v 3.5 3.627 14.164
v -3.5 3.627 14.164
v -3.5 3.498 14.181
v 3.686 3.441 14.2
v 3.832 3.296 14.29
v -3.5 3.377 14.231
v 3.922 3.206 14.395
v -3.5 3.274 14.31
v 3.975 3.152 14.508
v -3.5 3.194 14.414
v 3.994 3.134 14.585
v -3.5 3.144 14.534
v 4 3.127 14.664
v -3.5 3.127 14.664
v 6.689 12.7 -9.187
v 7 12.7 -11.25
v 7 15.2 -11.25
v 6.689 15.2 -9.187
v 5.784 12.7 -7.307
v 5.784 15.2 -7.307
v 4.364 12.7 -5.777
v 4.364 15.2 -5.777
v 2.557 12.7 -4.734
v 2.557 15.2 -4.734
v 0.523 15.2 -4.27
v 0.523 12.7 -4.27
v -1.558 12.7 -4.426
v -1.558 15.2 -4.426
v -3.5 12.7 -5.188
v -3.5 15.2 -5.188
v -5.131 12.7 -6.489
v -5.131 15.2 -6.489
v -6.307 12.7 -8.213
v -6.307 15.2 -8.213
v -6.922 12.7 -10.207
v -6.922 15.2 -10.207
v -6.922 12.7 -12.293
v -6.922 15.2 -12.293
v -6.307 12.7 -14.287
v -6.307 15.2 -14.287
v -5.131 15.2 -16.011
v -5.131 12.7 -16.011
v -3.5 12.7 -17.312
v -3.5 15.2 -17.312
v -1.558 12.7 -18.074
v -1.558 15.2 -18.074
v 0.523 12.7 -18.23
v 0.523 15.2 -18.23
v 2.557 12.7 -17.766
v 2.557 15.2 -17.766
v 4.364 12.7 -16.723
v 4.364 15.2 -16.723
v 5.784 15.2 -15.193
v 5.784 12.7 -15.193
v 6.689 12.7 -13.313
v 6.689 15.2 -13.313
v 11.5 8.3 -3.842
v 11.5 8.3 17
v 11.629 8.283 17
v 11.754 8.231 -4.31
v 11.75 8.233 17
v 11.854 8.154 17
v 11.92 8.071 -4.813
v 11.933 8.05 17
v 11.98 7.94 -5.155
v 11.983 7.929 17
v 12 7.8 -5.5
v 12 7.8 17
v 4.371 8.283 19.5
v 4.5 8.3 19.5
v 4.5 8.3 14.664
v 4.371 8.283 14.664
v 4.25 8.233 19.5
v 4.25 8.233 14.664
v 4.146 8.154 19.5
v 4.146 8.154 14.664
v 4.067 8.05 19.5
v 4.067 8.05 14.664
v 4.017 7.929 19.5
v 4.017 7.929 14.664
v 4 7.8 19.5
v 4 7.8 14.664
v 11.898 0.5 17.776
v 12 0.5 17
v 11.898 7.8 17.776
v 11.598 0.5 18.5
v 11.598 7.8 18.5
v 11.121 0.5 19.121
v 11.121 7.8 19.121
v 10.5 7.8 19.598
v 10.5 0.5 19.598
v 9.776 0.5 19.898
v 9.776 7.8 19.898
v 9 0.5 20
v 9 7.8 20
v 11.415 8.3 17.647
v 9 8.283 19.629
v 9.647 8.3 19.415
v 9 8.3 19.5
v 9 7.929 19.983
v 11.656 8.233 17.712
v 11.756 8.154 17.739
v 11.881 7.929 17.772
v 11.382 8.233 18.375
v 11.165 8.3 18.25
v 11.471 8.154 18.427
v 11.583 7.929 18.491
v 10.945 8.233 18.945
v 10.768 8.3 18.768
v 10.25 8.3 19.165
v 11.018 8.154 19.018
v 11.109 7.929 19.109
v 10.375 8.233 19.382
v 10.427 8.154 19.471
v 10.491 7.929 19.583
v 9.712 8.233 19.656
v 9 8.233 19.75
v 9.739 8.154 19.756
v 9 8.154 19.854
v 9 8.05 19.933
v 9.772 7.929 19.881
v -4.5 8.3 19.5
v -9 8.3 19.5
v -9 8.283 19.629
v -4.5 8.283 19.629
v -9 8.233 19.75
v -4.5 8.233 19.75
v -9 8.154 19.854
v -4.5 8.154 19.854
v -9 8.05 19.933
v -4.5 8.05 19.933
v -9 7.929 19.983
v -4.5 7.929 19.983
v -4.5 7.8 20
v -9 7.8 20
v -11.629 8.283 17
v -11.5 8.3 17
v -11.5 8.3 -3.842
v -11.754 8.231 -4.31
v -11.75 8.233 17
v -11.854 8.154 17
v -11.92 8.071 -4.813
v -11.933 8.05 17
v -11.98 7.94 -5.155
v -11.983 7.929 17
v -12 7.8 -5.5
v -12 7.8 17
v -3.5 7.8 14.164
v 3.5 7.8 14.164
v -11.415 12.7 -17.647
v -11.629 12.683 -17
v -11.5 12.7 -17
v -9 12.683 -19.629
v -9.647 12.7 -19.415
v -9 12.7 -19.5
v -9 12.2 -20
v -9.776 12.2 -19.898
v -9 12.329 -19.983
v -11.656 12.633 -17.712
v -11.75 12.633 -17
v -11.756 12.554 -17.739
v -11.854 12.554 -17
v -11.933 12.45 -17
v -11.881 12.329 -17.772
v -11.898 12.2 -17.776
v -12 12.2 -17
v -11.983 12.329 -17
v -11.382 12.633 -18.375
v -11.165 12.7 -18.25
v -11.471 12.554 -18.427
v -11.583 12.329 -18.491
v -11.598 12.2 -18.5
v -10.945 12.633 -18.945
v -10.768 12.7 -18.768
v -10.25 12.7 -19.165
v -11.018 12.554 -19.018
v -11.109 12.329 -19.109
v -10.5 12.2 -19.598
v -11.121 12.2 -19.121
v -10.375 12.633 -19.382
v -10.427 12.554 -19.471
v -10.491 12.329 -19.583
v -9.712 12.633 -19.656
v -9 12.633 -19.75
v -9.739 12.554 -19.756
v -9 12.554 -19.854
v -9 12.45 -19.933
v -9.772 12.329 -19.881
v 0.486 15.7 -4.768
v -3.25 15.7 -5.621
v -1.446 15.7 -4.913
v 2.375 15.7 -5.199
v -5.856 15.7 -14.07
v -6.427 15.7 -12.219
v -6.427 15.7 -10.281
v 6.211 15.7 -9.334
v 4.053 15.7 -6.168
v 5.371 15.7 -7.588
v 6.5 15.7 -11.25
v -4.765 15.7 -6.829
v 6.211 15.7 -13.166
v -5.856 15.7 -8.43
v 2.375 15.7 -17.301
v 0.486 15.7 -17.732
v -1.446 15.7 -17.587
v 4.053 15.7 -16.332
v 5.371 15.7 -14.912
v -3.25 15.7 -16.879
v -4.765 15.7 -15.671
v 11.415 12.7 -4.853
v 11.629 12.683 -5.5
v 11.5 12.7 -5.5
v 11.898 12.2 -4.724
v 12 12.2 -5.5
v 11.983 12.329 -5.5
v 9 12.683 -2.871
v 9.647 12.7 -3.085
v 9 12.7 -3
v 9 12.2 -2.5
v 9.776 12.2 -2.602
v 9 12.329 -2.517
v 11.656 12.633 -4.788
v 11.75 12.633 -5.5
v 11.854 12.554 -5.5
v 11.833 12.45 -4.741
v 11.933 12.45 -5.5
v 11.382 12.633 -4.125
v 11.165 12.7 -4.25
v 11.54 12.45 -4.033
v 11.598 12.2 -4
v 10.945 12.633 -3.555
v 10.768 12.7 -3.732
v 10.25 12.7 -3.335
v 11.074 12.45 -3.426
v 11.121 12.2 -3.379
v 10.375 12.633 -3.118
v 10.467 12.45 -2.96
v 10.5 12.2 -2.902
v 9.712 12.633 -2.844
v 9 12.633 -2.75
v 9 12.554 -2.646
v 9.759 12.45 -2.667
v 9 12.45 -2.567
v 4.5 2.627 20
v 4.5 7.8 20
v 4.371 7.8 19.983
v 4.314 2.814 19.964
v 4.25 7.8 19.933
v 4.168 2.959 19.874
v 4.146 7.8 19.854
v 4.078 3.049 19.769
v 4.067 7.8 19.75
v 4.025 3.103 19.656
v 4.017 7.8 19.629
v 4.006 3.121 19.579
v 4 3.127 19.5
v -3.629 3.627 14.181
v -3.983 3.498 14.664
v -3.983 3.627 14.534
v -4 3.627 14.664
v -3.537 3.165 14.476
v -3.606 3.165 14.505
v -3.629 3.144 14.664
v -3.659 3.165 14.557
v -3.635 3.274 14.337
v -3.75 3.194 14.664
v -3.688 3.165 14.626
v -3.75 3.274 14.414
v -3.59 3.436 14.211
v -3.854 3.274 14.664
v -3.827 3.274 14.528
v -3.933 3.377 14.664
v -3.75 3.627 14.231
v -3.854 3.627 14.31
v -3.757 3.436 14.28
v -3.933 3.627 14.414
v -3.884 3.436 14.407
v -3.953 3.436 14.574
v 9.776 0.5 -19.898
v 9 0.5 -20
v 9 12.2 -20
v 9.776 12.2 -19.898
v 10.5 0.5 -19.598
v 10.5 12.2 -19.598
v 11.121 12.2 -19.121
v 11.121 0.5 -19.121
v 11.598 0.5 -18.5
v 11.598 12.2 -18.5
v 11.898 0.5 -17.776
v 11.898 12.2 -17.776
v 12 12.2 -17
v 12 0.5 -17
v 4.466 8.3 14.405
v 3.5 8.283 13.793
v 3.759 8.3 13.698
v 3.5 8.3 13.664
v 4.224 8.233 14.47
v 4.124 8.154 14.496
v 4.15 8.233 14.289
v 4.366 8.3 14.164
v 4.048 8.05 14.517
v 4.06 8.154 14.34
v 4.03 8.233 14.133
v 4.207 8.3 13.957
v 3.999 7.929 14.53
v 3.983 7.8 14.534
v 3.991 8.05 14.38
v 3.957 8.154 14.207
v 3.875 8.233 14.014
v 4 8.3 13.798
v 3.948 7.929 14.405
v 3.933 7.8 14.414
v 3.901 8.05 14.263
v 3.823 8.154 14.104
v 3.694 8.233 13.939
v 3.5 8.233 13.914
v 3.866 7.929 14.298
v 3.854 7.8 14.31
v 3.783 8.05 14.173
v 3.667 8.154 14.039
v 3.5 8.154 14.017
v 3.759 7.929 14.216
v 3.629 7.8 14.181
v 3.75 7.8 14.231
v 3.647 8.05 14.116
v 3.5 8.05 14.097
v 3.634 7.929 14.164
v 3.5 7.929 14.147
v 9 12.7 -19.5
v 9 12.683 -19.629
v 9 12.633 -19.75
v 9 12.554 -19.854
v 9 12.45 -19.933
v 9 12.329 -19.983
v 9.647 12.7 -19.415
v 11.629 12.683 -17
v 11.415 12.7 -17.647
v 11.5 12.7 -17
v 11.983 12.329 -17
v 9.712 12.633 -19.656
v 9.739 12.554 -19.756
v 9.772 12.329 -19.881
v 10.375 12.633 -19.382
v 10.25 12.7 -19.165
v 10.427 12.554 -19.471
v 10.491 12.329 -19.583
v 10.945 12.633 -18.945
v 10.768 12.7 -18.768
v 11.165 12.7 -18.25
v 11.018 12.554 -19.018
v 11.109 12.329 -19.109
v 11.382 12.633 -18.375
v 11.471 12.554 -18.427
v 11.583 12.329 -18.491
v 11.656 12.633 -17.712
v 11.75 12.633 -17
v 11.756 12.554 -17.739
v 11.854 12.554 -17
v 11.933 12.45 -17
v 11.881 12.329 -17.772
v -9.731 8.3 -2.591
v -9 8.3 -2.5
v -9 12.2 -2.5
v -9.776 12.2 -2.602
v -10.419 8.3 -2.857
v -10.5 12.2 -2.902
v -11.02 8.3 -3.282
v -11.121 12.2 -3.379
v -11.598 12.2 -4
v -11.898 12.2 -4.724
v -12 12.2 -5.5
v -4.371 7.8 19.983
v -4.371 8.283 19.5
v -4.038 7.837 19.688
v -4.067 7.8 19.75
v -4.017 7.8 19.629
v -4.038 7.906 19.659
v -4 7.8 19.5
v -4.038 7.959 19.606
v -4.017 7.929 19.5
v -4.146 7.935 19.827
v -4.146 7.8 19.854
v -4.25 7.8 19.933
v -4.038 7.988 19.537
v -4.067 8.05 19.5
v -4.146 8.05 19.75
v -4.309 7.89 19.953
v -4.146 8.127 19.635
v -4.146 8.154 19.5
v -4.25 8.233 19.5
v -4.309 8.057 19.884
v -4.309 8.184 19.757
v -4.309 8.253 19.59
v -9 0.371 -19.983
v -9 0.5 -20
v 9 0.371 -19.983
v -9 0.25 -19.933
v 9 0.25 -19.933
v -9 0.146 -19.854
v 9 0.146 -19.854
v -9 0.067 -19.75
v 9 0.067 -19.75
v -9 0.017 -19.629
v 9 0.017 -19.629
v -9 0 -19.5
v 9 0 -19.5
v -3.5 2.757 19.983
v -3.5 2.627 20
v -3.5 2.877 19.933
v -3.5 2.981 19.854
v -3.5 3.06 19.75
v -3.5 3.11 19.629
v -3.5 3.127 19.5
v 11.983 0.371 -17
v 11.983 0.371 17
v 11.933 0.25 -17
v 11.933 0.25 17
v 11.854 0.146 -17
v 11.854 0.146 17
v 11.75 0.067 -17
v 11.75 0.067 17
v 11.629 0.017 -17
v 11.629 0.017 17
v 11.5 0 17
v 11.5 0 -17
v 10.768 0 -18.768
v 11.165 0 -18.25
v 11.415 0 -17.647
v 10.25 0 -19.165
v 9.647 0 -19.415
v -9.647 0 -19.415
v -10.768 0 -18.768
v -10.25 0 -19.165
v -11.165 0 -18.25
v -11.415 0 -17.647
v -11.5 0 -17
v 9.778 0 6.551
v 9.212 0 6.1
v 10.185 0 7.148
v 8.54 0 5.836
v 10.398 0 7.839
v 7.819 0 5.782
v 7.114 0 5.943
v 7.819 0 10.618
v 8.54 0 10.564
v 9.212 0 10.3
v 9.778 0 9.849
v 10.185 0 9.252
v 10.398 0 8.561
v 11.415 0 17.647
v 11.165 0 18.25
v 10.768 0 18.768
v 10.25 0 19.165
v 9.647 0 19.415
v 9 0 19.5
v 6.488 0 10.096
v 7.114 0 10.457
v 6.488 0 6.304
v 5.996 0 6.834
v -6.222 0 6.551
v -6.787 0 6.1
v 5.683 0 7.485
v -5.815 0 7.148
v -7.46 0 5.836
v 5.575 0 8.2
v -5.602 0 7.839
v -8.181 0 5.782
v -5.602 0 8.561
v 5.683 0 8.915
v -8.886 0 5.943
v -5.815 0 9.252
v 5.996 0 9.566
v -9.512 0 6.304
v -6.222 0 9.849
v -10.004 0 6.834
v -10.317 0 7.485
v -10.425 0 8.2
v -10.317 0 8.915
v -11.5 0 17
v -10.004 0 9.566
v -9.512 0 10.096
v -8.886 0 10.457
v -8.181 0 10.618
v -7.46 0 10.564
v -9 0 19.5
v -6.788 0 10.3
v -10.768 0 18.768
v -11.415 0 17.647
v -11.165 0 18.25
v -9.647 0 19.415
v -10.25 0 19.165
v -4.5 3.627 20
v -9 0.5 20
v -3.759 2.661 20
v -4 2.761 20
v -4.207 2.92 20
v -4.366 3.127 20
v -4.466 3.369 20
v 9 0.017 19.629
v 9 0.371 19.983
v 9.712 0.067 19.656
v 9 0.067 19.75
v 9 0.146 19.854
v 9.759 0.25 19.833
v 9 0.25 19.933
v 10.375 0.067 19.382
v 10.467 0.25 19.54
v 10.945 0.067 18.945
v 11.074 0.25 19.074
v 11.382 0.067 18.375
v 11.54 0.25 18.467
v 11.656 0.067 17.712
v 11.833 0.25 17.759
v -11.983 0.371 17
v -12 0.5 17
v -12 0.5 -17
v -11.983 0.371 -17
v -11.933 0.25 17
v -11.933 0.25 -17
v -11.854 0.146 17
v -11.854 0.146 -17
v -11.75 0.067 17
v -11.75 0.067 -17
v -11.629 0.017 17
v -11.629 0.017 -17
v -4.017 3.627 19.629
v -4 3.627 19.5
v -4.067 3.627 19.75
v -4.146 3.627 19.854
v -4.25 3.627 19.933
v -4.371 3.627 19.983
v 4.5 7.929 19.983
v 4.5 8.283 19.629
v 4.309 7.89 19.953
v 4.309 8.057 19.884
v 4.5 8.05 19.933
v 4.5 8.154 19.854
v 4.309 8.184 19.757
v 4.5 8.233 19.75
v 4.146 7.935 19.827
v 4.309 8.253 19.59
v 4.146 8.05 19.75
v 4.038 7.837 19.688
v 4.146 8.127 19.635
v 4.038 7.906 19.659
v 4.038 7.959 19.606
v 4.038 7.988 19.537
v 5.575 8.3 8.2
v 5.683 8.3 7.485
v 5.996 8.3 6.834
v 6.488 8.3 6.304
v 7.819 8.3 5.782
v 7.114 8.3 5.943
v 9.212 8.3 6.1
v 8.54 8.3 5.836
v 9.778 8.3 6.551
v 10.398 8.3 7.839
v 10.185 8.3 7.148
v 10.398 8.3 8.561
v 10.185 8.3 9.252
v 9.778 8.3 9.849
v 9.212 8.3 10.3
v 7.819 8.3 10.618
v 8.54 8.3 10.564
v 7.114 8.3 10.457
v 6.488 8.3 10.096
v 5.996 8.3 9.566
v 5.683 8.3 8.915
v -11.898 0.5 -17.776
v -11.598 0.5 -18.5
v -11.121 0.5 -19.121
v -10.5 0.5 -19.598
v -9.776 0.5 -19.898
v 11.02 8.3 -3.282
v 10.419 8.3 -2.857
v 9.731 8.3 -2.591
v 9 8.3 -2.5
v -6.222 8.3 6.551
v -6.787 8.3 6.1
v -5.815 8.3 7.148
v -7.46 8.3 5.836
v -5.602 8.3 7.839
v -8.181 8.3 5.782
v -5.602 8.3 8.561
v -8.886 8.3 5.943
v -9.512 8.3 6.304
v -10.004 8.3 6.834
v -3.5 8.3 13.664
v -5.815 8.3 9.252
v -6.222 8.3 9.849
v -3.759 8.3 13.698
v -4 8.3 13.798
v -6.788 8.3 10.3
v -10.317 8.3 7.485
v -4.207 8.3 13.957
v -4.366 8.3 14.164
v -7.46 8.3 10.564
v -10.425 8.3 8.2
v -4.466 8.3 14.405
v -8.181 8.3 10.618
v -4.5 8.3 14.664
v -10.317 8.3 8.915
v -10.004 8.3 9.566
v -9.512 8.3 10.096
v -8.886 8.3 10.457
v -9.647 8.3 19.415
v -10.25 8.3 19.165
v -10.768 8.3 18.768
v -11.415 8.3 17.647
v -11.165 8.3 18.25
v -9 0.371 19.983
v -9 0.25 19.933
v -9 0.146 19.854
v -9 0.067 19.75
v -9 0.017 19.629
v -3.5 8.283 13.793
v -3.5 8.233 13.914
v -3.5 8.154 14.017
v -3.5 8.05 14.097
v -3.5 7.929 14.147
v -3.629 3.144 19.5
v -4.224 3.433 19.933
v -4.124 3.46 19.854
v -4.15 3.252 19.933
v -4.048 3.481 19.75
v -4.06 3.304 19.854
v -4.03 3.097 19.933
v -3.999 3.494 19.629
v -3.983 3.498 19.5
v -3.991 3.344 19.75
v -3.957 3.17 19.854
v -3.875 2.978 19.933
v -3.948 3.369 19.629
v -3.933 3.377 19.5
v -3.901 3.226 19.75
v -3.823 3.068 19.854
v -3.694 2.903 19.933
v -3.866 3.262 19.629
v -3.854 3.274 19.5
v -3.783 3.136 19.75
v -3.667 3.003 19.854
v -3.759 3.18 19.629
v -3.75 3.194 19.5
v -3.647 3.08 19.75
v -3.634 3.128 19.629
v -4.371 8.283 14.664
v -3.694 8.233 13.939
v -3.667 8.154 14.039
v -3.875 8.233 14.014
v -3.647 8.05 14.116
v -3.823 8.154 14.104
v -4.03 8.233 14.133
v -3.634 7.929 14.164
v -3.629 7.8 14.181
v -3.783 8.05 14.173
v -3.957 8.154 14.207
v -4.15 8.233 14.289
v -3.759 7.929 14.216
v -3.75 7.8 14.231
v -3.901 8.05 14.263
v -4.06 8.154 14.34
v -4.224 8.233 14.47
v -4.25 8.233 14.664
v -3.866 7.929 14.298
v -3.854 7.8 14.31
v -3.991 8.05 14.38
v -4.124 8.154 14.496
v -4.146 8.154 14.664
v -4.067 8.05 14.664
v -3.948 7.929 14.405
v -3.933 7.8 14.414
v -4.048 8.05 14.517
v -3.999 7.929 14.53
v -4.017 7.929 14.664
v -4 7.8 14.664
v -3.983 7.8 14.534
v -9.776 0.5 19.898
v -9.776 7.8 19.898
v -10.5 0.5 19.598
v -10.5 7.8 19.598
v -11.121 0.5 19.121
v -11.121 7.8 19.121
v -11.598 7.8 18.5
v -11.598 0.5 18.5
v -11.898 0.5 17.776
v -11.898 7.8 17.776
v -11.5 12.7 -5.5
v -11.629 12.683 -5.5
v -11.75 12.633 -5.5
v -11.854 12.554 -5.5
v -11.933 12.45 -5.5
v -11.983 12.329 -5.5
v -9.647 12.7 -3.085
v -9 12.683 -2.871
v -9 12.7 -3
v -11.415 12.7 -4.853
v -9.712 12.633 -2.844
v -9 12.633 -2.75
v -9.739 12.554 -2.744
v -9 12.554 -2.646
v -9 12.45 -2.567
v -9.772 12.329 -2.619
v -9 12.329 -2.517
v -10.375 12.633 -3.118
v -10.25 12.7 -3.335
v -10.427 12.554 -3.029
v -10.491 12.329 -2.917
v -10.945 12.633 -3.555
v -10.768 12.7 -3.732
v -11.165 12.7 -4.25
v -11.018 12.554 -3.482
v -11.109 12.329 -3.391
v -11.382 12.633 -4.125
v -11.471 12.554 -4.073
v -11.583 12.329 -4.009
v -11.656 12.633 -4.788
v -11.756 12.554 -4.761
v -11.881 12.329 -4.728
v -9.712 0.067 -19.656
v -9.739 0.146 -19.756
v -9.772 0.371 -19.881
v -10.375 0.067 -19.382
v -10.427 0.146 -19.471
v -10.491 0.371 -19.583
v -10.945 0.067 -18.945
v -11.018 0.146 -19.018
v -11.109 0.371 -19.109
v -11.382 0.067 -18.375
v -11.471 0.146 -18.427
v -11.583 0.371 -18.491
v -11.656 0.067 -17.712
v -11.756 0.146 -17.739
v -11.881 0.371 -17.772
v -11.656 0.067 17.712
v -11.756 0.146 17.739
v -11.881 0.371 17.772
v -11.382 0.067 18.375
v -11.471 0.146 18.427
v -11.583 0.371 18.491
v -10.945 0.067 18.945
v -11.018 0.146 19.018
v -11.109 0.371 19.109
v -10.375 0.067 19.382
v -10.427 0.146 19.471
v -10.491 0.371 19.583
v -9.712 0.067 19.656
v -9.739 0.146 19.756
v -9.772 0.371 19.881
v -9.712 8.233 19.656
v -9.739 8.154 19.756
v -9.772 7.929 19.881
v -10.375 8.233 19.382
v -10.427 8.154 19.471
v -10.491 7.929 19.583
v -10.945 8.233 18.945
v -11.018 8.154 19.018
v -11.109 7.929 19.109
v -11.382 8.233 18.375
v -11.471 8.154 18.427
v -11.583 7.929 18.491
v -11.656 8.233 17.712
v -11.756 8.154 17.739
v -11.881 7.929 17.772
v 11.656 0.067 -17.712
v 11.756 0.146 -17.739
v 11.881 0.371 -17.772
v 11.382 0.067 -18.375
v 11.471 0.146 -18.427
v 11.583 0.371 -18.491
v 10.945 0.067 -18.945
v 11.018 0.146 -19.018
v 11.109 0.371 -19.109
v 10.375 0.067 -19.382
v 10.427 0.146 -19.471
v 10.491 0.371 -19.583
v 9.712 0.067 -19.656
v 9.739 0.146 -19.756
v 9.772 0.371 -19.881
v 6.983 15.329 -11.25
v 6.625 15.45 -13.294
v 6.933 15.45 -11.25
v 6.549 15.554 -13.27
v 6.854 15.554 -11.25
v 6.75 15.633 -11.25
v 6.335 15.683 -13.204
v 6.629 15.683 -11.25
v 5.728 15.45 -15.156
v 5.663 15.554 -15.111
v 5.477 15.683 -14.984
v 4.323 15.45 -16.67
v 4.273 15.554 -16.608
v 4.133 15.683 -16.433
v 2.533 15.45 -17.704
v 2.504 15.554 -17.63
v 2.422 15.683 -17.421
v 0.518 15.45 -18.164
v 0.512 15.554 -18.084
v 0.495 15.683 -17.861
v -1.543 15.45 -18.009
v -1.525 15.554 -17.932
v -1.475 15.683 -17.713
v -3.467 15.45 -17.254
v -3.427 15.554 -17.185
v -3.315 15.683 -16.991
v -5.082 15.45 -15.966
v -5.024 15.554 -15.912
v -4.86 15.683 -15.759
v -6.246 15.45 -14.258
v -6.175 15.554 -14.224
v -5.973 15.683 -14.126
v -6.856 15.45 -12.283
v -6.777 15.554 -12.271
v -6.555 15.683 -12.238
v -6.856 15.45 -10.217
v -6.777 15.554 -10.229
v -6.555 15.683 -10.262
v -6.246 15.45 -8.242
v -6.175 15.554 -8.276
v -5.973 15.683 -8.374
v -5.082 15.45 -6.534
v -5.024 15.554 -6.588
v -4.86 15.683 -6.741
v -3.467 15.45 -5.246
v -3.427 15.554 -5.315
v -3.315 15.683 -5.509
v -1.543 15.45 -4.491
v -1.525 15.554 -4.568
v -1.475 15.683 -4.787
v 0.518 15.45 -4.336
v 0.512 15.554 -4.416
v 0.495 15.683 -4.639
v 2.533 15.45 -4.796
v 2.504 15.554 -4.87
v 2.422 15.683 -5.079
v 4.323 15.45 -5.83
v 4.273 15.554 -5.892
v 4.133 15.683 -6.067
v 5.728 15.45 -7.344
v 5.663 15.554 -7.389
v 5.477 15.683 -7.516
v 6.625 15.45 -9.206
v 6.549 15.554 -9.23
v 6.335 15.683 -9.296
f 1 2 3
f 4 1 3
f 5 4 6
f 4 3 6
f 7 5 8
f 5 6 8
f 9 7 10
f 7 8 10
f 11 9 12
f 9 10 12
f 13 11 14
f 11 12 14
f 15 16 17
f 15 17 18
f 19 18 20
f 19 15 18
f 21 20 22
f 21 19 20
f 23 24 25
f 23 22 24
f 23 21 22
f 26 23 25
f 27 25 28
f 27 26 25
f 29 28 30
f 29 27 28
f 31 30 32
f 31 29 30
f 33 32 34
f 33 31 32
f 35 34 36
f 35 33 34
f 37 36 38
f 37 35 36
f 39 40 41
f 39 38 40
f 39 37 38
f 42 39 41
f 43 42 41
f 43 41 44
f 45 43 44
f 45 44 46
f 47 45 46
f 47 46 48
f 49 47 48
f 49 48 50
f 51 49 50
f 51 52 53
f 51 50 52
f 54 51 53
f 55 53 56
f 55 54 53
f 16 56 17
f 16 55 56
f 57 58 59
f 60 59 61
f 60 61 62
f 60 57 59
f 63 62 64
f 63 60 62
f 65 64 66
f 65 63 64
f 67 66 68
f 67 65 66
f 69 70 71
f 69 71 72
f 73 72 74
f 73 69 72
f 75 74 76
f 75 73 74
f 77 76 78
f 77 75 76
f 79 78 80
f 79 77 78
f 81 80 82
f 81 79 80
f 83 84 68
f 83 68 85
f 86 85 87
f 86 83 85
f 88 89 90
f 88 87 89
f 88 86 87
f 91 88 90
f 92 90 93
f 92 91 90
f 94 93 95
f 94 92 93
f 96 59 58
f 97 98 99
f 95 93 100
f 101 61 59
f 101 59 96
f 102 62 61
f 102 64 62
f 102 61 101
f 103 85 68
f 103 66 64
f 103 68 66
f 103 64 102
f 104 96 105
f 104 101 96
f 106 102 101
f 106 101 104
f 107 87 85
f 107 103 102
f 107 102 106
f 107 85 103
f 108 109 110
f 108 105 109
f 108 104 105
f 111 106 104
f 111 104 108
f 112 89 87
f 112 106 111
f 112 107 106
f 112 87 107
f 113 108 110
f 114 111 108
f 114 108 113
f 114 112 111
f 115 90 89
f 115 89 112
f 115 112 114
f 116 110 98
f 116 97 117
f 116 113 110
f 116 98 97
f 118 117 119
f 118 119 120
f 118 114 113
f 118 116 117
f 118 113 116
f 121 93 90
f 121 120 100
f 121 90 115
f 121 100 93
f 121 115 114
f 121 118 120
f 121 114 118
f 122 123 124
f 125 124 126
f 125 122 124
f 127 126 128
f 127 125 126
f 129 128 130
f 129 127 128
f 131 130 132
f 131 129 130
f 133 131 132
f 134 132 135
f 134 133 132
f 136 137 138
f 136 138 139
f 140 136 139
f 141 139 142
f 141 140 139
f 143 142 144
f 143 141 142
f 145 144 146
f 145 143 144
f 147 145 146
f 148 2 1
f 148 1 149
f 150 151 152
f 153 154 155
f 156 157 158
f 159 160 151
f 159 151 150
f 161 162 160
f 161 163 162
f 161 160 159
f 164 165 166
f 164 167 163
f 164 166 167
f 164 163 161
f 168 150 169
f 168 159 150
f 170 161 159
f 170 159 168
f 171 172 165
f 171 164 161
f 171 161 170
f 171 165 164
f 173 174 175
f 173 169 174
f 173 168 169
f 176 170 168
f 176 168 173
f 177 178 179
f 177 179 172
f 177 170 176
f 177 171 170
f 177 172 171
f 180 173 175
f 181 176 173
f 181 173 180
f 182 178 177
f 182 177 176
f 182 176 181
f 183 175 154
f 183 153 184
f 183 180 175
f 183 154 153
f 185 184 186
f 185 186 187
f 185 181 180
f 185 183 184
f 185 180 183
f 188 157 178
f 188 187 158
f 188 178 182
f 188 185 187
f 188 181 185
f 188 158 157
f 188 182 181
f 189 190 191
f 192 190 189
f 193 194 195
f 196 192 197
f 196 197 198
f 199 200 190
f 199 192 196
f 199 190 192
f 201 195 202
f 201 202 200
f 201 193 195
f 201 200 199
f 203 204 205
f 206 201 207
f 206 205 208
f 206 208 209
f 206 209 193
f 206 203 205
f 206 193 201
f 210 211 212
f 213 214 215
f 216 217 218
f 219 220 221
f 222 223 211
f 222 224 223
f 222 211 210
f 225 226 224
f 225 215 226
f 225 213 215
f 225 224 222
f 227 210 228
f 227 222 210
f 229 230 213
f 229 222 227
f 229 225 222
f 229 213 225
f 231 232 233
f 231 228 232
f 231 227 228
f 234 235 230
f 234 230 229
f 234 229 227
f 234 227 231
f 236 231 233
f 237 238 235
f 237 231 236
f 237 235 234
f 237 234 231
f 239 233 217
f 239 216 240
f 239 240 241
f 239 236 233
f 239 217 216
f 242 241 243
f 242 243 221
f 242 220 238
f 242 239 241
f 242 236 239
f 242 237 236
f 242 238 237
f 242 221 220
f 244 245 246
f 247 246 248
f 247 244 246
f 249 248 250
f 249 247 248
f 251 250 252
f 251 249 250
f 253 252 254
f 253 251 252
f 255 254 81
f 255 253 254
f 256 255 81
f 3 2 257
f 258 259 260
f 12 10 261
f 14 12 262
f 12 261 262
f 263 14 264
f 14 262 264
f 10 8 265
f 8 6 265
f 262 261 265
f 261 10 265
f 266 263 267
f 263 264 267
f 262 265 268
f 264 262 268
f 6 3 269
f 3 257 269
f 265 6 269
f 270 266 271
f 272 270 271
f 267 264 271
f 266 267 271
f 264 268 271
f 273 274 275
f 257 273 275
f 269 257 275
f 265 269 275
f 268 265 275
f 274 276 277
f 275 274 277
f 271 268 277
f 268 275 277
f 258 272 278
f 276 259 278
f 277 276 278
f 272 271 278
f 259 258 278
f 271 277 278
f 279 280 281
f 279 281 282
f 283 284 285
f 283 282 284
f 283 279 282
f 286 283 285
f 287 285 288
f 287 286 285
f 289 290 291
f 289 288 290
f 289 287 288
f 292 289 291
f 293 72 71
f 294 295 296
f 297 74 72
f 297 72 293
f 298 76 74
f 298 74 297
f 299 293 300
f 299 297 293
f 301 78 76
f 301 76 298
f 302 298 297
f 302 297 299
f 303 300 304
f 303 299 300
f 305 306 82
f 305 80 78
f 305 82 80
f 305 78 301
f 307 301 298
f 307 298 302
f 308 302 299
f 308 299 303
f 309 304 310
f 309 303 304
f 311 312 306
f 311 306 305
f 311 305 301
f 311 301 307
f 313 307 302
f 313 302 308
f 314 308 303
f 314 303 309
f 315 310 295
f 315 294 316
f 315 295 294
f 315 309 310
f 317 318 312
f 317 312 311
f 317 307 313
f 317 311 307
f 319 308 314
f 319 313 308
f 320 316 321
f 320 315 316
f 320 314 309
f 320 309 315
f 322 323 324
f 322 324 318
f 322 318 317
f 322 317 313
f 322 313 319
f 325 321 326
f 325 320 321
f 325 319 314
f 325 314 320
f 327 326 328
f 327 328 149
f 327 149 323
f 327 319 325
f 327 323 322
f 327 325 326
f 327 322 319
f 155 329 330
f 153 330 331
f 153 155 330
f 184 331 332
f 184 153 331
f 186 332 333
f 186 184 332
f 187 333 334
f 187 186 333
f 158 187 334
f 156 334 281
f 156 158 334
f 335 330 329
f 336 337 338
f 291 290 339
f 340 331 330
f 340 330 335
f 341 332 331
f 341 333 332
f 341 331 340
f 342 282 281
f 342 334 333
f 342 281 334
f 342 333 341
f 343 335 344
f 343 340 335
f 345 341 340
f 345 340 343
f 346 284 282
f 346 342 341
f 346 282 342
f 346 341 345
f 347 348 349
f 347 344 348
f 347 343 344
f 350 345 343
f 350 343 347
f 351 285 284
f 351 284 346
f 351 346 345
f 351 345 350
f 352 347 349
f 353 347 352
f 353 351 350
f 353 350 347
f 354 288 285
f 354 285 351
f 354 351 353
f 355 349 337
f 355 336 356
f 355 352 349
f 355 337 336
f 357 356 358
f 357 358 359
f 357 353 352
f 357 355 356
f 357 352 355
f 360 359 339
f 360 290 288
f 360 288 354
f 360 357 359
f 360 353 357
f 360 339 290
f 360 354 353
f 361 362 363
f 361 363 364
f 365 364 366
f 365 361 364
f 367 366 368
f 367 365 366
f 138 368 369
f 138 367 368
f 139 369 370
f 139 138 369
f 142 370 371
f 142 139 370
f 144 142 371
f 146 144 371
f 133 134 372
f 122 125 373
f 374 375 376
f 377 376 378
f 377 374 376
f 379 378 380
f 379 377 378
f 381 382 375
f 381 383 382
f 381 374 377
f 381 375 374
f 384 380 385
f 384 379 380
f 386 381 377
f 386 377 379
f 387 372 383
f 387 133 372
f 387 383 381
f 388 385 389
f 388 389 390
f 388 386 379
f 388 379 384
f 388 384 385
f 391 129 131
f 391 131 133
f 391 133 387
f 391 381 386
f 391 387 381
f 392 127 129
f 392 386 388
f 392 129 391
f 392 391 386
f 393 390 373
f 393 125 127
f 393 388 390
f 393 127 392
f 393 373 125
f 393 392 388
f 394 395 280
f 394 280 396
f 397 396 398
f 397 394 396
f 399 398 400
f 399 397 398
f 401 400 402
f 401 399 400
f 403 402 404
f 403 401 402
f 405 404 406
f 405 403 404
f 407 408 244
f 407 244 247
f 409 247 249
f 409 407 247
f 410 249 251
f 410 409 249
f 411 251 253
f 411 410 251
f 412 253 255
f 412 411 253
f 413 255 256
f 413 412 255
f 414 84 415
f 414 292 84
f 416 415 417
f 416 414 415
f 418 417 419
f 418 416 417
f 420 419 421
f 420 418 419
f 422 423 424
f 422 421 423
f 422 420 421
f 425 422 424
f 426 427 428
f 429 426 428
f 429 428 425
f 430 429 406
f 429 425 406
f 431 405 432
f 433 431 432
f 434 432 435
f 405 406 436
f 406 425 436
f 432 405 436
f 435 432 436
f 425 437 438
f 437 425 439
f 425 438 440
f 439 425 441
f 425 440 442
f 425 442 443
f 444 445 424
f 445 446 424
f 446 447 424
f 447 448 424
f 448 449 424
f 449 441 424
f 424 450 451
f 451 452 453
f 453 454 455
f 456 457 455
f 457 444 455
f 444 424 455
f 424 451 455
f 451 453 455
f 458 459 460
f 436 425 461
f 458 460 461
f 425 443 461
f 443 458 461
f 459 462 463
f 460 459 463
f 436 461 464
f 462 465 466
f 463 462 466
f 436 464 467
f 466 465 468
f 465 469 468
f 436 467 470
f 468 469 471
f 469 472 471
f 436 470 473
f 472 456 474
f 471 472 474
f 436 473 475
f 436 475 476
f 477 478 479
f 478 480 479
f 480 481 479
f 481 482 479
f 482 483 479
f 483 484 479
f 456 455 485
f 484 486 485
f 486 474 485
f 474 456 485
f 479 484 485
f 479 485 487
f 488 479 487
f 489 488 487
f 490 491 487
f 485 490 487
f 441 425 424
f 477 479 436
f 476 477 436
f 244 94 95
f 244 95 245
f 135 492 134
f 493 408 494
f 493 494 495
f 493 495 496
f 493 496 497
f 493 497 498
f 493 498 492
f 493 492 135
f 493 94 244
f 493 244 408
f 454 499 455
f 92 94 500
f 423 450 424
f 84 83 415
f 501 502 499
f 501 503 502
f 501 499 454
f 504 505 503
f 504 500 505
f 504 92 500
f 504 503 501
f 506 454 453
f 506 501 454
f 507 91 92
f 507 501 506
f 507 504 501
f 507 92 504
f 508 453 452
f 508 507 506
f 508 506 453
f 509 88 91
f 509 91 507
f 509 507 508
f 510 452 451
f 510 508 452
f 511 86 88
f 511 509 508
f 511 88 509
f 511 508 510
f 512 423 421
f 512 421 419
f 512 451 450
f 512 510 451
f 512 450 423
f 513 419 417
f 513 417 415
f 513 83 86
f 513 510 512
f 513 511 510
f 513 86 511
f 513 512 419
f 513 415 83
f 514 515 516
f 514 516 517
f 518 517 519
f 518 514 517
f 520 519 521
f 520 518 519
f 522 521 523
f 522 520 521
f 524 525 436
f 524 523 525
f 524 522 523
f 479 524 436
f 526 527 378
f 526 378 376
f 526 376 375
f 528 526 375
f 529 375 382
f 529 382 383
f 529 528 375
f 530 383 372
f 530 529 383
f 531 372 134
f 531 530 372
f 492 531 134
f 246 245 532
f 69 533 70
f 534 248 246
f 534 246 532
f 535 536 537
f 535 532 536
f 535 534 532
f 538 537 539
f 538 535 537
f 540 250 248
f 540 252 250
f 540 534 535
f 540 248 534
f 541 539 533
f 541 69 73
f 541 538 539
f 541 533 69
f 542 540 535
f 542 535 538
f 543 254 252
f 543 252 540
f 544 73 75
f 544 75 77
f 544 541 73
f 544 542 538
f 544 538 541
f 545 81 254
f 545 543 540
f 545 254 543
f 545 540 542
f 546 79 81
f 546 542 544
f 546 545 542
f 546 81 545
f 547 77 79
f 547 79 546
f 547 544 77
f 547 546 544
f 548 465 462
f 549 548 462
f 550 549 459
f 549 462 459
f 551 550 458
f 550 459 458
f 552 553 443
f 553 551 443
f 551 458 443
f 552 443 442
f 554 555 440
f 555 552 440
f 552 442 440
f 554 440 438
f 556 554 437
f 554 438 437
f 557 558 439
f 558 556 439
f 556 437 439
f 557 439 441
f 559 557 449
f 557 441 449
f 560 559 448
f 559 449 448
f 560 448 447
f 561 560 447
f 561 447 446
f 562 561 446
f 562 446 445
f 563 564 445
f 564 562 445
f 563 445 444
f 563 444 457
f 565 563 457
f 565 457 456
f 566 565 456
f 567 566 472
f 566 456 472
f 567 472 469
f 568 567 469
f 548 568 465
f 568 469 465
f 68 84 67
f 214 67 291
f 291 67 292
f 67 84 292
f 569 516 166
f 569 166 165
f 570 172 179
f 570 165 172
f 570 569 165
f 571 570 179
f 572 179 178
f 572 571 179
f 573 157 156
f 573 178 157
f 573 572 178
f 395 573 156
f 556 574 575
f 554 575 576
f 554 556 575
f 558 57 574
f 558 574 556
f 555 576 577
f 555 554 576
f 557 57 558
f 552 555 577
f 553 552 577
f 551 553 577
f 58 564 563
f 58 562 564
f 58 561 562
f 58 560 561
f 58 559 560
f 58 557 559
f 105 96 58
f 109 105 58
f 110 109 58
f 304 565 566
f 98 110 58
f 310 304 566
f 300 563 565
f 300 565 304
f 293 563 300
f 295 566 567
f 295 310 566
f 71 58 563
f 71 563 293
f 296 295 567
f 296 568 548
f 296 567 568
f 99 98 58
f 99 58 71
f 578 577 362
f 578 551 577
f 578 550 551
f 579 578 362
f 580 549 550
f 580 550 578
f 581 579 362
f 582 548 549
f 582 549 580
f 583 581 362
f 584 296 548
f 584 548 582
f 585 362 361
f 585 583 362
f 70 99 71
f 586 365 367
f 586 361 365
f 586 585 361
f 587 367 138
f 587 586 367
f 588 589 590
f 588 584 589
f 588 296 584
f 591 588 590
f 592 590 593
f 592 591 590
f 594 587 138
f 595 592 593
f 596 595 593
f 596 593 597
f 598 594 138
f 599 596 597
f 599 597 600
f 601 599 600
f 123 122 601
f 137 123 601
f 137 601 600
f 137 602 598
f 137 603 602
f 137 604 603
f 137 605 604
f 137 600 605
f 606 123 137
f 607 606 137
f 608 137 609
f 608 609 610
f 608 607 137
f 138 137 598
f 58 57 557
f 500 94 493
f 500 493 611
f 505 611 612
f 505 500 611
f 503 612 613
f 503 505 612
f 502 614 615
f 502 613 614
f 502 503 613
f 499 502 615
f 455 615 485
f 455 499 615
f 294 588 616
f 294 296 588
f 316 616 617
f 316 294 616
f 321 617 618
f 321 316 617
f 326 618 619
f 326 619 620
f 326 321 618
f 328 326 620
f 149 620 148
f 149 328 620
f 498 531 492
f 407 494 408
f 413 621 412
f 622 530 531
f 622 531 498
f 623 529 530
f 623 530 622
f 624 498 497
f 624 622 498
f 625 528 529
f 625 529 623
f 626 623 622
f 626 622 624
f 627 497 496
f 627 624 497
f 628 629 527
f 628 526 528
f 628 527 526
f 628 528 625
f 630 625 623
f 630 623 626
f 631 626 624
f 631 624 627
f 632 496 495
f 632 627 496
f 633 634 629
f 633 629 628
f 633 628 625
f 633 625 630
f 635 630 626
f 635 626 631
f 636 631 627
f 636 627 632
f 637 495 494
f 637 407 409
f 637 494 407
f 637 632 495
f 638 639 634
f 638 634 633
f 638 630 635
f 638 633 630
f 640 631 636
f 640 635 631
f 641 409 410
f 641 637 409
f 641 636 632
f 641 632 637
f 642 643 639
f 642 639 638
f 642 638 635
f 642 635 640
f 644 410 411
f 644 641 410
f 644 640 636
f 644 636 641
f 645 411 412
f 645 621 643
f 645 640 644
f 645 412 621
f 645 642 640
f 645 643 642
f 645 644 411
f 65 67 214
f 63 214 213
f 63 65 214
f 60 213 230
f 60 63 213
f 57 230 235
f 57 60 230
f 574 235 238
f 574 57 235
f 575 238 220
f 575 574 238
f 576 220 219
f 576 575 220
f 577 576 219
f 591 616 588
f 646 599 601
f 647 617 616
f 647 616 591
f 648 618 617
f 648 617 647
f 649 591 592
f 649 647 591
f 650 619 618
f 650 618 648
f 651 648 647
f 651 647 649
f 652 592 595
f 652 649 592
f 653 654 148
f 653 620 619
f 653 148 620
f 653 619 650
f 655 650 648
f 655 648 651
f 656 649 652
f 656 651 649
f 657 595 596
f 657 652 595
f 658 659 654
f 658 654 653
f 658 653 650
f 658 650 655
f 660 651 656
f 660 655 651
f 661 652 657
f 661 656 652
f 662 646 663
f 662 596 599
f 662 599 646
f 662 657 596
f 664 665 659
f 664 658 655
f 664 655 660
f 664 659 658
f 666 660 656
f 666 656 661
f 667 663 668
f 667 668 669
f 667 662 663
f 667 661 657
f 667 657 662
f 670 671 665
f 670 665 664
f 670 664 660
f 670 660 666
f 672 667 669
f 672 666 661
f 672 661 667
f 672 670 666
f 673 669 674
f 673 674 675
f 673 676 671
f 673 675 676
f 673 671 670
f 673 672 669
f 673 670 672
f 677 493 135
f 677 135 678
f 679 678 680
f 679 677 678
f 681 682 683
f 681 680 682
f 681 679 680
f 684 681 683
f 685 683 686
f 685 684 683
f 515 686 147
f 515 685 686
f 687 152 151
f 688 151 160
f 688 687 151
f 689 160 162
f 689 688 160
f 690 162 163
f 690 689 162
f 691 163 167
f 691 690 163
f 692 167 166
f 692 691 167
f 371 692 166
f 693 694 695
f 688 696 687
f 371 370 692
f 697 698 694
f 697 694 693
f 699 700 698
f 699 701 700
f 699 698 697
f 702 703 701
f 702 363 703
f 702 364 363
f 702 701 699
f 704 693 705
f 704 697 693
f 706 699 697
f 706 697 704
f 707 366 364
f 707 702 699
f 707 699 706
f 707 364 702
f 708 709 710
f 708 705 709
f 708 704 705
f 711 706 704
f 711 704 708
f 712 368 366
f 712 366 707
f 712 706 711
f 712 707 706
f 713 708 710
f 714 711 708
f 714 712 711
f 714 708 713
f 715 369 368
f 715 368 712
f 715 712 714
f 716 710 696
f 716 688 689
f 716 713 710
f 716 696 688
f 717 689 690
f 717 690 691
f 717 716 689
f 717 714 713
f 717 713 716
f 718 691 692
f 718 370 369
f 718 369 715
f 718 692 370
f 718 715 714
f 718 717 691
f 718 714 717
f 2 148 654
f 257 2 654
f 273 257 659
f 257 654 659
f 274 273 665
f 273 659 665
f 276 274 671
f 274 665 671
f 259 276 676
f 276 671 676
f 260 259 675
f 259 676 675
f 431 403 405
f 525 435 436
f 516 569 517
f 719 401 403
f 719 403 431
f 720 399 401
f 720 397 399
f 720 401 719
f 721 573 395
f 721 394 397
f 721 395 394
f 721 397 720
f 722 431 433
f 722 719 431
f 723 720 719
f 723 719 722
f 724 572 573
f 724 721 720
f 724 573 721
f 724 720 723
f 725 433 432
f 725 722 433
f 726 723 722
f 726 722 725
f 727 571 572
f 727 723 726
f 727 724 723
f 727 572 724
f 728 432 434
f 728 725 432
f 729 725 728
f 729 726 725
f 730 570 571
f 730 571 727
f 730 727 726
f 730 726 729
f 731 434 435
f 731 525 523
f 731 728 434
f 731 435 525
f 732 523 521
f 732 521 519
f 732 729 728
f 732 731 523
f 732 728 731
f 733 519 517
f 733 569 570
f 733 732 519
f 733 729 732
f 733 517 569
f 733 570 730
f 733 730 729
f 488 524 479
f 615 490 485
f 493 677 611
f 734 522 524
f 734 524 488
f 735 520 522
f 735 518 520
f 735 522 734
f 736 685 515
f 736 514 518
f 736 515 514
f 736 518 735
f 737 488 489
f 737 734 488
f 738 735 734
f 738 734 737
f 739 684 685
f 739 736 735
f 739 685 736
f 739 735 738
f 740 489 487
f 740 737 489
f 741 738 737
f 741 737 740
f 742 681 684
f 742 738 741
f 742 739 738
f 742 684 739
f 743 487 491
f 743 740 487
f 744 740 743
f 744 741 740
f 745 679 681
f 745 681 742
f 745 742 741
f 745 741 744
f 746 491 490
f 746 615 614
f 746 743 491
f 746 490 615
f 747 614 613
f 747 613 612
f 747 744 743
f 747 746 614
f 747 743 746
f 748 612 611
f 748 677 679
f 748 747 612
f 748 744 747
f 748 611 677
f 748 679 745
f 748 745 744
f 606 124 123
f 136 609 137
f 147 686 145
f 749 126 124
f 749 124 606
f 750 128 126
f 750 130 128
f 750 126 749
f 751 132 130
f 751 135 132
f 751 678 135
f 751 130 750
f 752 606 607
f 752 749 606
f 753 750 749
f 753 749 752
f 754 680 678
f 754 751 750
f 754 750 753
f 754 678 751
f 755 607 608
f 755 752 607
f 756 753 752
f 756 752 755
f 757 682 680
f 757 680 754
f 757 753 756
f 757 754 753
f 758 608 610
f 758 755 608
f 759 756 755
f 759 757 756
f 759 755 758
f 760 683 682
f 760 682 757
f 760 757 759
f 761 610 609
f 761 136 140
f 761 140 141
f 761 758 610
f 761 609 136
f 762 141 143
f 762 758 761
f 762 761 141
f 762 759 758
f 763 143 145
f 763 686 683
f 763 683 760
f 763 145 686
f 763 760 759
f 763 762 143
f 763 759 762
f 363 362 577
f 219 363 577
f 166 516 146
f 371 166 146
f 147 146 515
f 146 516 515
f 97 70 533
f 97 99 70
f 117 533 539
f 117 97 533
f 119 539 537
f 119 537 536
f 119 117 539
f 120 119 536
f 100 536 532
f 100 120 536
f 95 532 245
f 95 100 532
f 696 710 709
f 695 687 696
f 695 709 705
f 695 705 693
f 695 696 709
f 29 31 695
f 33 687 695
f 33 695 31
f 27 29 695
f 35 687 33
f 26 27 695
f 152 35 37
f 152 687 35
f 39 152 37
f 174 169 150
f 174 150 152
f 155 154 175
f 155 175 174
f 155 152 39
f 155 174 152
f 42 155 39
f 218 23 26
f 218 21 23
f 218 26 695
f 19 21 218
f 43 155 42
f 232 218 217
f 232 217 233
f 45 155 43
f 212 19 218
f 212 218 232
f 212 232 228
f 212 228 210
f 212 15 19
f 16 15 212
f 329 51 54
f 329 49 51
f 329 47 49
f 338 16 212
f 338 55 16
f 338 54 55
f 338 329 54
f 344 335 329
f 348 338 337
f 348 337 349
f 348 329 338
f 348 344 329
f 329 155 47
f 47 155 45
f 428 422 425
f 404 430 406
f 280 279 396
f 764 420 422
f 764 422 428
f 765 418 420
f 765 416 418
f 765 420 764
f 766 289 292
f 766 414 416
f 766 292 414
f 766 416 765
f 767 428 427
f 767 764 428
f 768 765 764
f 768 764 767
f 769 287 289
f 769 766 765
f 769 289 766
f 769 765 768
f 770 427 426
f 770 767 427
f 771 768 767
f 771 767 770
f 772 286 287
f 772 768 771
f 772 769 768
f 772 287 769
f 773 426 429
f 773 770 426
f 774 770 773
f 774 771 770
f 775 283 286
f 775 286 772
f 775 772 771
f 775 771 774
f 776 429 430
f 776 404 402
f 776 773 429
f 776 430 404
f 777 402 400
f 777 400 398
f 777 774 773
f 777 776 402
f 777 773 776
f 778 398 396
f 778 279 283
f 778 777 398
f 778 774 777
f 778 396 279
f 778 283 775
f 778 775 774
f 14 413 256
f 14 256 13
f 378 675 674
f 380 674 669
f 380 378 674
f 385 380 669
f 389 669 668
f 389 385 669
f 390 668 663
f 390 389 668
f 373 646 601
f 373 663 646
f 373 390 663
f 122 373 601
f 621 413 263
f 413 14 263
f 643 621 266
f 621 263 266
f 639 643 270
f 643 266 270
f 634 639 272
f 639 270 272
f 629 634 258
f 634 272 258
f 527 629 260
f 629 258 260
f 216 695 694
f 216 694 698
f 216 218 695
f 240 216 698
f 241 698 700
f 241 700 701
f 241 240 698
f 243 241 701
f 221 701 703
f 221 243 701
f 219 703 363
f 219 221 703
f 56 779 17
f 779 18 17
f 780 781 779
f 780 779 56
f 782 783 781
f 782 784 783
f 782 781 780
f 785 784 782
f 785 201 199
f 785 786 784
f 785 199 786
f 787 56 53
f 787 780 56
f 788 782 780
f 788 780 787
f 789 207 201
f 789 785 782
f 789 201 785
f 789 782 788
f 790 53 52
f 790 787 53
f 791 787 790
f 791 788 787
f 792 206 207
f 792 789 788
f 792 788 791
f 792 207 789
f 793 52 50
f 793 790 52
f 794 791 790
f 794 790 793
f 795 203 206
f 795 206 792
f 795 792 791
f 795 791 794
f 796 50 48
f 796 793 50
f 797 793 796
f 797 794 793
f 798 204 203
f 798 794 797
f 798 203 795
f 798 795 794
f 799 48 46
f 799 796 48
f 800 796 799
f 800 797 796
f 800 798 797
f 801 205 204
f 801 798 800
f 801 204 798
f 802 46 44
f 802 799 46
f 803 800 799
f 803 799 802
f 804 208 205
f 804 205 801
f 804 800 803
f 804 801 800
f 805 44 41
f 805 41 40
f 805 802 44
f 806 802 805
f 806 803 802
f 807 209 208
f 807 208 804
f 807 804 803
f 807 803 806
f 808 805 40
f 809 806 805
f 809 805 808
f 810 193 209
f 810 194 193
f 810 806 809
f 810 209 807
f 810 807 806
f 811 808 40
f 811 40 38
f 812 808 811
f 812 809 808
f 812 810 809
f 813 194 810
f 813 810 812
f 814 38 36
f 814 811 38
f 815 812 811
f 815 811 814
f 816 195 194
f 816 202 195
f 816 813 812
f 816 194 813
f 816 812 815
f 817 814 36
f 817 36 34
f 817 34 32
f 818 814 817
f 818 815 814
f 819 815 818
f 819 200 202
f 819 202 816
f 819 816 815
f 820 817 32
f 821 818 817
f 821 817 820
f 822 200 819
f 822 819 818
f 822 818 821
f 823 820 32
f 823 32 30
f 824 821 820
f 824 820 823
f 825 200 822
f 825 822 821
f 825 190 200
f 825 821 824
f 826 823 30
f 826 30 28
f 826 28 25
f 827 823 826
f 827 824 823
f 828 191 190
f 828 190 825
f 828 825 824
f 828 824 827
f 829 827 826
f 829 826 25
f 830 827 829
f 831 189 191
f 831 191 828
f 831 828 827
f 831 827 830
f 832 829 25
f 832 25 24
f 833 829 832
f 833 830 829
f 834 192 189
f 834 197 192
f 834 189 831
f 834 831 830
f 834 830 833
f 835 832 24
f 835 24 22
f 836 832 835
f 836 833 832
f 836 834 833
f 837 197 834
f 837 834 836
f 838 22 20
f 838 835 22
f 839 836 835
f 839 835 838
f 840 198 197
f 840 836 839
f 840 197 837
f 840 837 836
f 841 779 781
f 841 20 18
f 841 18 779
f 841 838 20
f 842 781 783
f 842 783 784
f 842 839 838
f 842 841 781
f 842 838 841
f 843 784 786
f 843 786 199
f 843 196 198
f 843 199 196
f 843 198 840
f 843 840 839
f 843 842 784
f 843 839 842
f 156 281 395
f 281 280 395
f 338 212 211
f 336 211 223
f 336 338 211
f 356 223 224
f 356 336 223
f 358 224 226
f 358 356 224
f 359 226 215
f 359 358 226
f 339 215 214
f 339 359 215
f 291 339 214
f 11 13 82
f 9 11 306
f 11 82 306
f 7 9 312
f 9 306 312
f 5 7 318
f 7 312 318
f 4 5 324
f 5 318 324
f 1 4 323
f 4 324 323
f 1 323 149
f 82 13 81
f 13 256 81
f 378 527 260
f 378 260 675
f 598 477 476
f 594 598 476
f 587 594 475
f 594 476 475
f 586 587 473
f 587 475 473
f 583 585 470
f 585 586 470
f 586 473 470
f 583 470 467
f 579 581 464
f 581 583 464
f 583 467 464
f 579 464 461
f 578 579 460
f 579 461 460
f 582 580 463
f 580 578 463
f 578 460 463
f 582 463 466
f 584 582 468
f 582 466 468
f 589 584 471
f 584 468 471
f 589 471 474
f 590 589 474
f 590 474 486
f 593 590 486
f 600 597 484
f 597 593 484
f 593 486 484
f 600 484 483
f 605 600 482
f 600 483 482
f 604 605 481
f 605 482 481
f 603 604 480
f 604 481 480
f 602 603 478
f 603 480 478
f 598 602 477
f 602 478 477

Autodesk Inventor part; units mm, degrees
ref_plane "YZ Plane" through (0, 0, 0) normal (1, 0, 0) x (0, 1, 0)
ref_plane "XZ Plane" through (0, 0, 0) normal (0, 1, 0) x (-1, 0, 0)
ref_plane "XY Plane" through (0, 0, 0) normal (0, 0, 1) x (1, 0, 0)
sketch "スケッチ1" plane through (0, 0, 0) normal (0, 1, 0) x (-1, 0, 0)
  line L0 (-9, 20) -> (9, 20)
  line L1 (12, 17) -> (12, -17)
  line L2 (9, -20) -> (-9, -20)
  line L3 (-12, -17) -> (-12, 17)
  line L4 (-12, 20) -> (12, -20) construction
  line L5 (12, 20) -> (-12, -20) construction
  line L6 (0, -28.8698) -> (0, 28.8698) projected
  circle A0 centre (8, 8.2) radius 2.425
  circle A1 centre (-8, 8.2) radius 2.425
  arc A2 (12, 17) -> (9, 20) centre (9, 17) ccw
  arc A3 (-9, 20) -> (-12, 17) centre (-9, 17) ccw
  arc A4 (-12, -17) -> (-9, -20) centre (-9, -17) ccw
  arc A5 (9, -20) -> (12, -17) centre (9, -17) ccw
  point P0 (0, 0)
  dimension "d0" = 24
  dimension "d1" = 40
  dimension "d4" = 4.85
  dimension "d5" = 16
  dimension "d6" = 11.8
  dimension "d7" = 3
extrude "押し出し1" add sketch "スケッチ1" along normal blind 8.3
sketch "スケッチ2" plane through (0, 8.3, 0) normal (0, 1, 0) x (1, 0, 0)
  line L0 (-12, 17) -> (-12, -17) projected
  line L1 (-9, 2.5) -> (9, 2.5)
  line L2 (12, -17) -> (12, 17) projected
  line L3 (-12, 17) -> (-12, 5.5)
  line L4 (12, 17) -> (12, 5.5)
  arc A0 (-12, 5.5) -> (-9, 2.5) centre (-9, 5.5) ccw
  arc A1 (9, 2.5) -> (12, 5.5) centre (9, 5.5) ccw
  line L5 (9, 20) -> (-9, 20) projected
  arc A2 (-9, 20) -> (-12, 17) centre (-9, 17) ccw projected
  arc A3 (12, 17) -> (9, 20) centre (9, 17) ccw projected
  point P0 (0, 0)
  point P1 (-12, 2.5)
  point P2 (12, 2.5)
  dimension "d10" = 3
  dimension "d11" = 17.5
extrude "押し出し2" add sketch "スケッチ2" along normal blind 4.4
sketch "スケッチ3" plane through (0, 12.7, 0) normal (0, 1, 0) x (1, 0, 0)
  circle A0 centre (0, 11.25) radius 7
  line L0 (-12, 17) -> (-12, 5.5) projected
  line L1 (-12, 11.25) -> (12, 11.25) construction
  line L2 (12, 5.5) -> (12, 17) projected
  line L3 (9, 20) -> (-9, 20) projected
  line L4 (0, 20) -> (0, 2.5) construction
  line L5 (-9, 2.5) -> (9, 2.5) projected
  point P0 (0, 0)
  dimension "d14" = 14
extrude "押し出し3" add sketch "スケッチ3" along normal blind 3
fillet "フィレット1" radius 0.5 1 edges at (-7, 15.7, -11.25)
fillet "フィレット2" radius 0.5 21 edges at (11.1213, 8.3, 19.1213) (0, 8.3, 20) (-11.1213, 8.3, 19.1213) (-12, 8.3, 5.75) (12, 8.3, 5.75) (11.1213, 12.7, -3.3787) (12, 12.7, -11.25) (11.1213, 12.7, -19.1213) (0, 12.7, -20) (-11.1213, 12.7, -19.1213) (-12, 12.7, -11.25) (-11.1213, 12.7, -3.3787) (0, 12.7, -2.5) (11.1213, 0, 19.1213) (12, 0, 0) (11.1213, 0, -19.1213) (0, 0, -20) (-11.1213, 0, -19.1213) (-12, 0, 0) (-11.1213, 0, 19.1213) (0, 0, 20)
sketch "スケッチ4" plane through (0, 0, 0) normal (1, 0, 0) x (0, 1, 0)
  line L0 (10.3657, 22.992) -> (3.1274, 22.992)
  line L1 (3.1274, 22.992) -> (3.1274, 14.1637)
  line L2 (3.1274, 14.1637) -> (10.3657, 14.1637)
  line L3 (10.3657, 14.1637) -> (10.3657, 22.992)
  point P0 (0, 0)
extrude "押し出し4" cut sketch "スケッチ4" along normal mid plane 8
fillet "フィレット3" radius 0.5 12 edges at (0, 8.3, 14.1637) (-4, 8.1536, 19.8536) (-4, 5.4637, 20) (-4, 8.3, 16.8319) (-4, 5.7137, 14.1637) (-4, 3.1274, 17.0819) (0, 3.1274, 14.1637) (4, 8.1536, 19.8536) (4, 8.3, 16.8319) (4, 5.4637, 20) (0, 3.1274, 20) (4, 5.7137, 14.1637)
properties part number "UnitV_OV7740_M12"
